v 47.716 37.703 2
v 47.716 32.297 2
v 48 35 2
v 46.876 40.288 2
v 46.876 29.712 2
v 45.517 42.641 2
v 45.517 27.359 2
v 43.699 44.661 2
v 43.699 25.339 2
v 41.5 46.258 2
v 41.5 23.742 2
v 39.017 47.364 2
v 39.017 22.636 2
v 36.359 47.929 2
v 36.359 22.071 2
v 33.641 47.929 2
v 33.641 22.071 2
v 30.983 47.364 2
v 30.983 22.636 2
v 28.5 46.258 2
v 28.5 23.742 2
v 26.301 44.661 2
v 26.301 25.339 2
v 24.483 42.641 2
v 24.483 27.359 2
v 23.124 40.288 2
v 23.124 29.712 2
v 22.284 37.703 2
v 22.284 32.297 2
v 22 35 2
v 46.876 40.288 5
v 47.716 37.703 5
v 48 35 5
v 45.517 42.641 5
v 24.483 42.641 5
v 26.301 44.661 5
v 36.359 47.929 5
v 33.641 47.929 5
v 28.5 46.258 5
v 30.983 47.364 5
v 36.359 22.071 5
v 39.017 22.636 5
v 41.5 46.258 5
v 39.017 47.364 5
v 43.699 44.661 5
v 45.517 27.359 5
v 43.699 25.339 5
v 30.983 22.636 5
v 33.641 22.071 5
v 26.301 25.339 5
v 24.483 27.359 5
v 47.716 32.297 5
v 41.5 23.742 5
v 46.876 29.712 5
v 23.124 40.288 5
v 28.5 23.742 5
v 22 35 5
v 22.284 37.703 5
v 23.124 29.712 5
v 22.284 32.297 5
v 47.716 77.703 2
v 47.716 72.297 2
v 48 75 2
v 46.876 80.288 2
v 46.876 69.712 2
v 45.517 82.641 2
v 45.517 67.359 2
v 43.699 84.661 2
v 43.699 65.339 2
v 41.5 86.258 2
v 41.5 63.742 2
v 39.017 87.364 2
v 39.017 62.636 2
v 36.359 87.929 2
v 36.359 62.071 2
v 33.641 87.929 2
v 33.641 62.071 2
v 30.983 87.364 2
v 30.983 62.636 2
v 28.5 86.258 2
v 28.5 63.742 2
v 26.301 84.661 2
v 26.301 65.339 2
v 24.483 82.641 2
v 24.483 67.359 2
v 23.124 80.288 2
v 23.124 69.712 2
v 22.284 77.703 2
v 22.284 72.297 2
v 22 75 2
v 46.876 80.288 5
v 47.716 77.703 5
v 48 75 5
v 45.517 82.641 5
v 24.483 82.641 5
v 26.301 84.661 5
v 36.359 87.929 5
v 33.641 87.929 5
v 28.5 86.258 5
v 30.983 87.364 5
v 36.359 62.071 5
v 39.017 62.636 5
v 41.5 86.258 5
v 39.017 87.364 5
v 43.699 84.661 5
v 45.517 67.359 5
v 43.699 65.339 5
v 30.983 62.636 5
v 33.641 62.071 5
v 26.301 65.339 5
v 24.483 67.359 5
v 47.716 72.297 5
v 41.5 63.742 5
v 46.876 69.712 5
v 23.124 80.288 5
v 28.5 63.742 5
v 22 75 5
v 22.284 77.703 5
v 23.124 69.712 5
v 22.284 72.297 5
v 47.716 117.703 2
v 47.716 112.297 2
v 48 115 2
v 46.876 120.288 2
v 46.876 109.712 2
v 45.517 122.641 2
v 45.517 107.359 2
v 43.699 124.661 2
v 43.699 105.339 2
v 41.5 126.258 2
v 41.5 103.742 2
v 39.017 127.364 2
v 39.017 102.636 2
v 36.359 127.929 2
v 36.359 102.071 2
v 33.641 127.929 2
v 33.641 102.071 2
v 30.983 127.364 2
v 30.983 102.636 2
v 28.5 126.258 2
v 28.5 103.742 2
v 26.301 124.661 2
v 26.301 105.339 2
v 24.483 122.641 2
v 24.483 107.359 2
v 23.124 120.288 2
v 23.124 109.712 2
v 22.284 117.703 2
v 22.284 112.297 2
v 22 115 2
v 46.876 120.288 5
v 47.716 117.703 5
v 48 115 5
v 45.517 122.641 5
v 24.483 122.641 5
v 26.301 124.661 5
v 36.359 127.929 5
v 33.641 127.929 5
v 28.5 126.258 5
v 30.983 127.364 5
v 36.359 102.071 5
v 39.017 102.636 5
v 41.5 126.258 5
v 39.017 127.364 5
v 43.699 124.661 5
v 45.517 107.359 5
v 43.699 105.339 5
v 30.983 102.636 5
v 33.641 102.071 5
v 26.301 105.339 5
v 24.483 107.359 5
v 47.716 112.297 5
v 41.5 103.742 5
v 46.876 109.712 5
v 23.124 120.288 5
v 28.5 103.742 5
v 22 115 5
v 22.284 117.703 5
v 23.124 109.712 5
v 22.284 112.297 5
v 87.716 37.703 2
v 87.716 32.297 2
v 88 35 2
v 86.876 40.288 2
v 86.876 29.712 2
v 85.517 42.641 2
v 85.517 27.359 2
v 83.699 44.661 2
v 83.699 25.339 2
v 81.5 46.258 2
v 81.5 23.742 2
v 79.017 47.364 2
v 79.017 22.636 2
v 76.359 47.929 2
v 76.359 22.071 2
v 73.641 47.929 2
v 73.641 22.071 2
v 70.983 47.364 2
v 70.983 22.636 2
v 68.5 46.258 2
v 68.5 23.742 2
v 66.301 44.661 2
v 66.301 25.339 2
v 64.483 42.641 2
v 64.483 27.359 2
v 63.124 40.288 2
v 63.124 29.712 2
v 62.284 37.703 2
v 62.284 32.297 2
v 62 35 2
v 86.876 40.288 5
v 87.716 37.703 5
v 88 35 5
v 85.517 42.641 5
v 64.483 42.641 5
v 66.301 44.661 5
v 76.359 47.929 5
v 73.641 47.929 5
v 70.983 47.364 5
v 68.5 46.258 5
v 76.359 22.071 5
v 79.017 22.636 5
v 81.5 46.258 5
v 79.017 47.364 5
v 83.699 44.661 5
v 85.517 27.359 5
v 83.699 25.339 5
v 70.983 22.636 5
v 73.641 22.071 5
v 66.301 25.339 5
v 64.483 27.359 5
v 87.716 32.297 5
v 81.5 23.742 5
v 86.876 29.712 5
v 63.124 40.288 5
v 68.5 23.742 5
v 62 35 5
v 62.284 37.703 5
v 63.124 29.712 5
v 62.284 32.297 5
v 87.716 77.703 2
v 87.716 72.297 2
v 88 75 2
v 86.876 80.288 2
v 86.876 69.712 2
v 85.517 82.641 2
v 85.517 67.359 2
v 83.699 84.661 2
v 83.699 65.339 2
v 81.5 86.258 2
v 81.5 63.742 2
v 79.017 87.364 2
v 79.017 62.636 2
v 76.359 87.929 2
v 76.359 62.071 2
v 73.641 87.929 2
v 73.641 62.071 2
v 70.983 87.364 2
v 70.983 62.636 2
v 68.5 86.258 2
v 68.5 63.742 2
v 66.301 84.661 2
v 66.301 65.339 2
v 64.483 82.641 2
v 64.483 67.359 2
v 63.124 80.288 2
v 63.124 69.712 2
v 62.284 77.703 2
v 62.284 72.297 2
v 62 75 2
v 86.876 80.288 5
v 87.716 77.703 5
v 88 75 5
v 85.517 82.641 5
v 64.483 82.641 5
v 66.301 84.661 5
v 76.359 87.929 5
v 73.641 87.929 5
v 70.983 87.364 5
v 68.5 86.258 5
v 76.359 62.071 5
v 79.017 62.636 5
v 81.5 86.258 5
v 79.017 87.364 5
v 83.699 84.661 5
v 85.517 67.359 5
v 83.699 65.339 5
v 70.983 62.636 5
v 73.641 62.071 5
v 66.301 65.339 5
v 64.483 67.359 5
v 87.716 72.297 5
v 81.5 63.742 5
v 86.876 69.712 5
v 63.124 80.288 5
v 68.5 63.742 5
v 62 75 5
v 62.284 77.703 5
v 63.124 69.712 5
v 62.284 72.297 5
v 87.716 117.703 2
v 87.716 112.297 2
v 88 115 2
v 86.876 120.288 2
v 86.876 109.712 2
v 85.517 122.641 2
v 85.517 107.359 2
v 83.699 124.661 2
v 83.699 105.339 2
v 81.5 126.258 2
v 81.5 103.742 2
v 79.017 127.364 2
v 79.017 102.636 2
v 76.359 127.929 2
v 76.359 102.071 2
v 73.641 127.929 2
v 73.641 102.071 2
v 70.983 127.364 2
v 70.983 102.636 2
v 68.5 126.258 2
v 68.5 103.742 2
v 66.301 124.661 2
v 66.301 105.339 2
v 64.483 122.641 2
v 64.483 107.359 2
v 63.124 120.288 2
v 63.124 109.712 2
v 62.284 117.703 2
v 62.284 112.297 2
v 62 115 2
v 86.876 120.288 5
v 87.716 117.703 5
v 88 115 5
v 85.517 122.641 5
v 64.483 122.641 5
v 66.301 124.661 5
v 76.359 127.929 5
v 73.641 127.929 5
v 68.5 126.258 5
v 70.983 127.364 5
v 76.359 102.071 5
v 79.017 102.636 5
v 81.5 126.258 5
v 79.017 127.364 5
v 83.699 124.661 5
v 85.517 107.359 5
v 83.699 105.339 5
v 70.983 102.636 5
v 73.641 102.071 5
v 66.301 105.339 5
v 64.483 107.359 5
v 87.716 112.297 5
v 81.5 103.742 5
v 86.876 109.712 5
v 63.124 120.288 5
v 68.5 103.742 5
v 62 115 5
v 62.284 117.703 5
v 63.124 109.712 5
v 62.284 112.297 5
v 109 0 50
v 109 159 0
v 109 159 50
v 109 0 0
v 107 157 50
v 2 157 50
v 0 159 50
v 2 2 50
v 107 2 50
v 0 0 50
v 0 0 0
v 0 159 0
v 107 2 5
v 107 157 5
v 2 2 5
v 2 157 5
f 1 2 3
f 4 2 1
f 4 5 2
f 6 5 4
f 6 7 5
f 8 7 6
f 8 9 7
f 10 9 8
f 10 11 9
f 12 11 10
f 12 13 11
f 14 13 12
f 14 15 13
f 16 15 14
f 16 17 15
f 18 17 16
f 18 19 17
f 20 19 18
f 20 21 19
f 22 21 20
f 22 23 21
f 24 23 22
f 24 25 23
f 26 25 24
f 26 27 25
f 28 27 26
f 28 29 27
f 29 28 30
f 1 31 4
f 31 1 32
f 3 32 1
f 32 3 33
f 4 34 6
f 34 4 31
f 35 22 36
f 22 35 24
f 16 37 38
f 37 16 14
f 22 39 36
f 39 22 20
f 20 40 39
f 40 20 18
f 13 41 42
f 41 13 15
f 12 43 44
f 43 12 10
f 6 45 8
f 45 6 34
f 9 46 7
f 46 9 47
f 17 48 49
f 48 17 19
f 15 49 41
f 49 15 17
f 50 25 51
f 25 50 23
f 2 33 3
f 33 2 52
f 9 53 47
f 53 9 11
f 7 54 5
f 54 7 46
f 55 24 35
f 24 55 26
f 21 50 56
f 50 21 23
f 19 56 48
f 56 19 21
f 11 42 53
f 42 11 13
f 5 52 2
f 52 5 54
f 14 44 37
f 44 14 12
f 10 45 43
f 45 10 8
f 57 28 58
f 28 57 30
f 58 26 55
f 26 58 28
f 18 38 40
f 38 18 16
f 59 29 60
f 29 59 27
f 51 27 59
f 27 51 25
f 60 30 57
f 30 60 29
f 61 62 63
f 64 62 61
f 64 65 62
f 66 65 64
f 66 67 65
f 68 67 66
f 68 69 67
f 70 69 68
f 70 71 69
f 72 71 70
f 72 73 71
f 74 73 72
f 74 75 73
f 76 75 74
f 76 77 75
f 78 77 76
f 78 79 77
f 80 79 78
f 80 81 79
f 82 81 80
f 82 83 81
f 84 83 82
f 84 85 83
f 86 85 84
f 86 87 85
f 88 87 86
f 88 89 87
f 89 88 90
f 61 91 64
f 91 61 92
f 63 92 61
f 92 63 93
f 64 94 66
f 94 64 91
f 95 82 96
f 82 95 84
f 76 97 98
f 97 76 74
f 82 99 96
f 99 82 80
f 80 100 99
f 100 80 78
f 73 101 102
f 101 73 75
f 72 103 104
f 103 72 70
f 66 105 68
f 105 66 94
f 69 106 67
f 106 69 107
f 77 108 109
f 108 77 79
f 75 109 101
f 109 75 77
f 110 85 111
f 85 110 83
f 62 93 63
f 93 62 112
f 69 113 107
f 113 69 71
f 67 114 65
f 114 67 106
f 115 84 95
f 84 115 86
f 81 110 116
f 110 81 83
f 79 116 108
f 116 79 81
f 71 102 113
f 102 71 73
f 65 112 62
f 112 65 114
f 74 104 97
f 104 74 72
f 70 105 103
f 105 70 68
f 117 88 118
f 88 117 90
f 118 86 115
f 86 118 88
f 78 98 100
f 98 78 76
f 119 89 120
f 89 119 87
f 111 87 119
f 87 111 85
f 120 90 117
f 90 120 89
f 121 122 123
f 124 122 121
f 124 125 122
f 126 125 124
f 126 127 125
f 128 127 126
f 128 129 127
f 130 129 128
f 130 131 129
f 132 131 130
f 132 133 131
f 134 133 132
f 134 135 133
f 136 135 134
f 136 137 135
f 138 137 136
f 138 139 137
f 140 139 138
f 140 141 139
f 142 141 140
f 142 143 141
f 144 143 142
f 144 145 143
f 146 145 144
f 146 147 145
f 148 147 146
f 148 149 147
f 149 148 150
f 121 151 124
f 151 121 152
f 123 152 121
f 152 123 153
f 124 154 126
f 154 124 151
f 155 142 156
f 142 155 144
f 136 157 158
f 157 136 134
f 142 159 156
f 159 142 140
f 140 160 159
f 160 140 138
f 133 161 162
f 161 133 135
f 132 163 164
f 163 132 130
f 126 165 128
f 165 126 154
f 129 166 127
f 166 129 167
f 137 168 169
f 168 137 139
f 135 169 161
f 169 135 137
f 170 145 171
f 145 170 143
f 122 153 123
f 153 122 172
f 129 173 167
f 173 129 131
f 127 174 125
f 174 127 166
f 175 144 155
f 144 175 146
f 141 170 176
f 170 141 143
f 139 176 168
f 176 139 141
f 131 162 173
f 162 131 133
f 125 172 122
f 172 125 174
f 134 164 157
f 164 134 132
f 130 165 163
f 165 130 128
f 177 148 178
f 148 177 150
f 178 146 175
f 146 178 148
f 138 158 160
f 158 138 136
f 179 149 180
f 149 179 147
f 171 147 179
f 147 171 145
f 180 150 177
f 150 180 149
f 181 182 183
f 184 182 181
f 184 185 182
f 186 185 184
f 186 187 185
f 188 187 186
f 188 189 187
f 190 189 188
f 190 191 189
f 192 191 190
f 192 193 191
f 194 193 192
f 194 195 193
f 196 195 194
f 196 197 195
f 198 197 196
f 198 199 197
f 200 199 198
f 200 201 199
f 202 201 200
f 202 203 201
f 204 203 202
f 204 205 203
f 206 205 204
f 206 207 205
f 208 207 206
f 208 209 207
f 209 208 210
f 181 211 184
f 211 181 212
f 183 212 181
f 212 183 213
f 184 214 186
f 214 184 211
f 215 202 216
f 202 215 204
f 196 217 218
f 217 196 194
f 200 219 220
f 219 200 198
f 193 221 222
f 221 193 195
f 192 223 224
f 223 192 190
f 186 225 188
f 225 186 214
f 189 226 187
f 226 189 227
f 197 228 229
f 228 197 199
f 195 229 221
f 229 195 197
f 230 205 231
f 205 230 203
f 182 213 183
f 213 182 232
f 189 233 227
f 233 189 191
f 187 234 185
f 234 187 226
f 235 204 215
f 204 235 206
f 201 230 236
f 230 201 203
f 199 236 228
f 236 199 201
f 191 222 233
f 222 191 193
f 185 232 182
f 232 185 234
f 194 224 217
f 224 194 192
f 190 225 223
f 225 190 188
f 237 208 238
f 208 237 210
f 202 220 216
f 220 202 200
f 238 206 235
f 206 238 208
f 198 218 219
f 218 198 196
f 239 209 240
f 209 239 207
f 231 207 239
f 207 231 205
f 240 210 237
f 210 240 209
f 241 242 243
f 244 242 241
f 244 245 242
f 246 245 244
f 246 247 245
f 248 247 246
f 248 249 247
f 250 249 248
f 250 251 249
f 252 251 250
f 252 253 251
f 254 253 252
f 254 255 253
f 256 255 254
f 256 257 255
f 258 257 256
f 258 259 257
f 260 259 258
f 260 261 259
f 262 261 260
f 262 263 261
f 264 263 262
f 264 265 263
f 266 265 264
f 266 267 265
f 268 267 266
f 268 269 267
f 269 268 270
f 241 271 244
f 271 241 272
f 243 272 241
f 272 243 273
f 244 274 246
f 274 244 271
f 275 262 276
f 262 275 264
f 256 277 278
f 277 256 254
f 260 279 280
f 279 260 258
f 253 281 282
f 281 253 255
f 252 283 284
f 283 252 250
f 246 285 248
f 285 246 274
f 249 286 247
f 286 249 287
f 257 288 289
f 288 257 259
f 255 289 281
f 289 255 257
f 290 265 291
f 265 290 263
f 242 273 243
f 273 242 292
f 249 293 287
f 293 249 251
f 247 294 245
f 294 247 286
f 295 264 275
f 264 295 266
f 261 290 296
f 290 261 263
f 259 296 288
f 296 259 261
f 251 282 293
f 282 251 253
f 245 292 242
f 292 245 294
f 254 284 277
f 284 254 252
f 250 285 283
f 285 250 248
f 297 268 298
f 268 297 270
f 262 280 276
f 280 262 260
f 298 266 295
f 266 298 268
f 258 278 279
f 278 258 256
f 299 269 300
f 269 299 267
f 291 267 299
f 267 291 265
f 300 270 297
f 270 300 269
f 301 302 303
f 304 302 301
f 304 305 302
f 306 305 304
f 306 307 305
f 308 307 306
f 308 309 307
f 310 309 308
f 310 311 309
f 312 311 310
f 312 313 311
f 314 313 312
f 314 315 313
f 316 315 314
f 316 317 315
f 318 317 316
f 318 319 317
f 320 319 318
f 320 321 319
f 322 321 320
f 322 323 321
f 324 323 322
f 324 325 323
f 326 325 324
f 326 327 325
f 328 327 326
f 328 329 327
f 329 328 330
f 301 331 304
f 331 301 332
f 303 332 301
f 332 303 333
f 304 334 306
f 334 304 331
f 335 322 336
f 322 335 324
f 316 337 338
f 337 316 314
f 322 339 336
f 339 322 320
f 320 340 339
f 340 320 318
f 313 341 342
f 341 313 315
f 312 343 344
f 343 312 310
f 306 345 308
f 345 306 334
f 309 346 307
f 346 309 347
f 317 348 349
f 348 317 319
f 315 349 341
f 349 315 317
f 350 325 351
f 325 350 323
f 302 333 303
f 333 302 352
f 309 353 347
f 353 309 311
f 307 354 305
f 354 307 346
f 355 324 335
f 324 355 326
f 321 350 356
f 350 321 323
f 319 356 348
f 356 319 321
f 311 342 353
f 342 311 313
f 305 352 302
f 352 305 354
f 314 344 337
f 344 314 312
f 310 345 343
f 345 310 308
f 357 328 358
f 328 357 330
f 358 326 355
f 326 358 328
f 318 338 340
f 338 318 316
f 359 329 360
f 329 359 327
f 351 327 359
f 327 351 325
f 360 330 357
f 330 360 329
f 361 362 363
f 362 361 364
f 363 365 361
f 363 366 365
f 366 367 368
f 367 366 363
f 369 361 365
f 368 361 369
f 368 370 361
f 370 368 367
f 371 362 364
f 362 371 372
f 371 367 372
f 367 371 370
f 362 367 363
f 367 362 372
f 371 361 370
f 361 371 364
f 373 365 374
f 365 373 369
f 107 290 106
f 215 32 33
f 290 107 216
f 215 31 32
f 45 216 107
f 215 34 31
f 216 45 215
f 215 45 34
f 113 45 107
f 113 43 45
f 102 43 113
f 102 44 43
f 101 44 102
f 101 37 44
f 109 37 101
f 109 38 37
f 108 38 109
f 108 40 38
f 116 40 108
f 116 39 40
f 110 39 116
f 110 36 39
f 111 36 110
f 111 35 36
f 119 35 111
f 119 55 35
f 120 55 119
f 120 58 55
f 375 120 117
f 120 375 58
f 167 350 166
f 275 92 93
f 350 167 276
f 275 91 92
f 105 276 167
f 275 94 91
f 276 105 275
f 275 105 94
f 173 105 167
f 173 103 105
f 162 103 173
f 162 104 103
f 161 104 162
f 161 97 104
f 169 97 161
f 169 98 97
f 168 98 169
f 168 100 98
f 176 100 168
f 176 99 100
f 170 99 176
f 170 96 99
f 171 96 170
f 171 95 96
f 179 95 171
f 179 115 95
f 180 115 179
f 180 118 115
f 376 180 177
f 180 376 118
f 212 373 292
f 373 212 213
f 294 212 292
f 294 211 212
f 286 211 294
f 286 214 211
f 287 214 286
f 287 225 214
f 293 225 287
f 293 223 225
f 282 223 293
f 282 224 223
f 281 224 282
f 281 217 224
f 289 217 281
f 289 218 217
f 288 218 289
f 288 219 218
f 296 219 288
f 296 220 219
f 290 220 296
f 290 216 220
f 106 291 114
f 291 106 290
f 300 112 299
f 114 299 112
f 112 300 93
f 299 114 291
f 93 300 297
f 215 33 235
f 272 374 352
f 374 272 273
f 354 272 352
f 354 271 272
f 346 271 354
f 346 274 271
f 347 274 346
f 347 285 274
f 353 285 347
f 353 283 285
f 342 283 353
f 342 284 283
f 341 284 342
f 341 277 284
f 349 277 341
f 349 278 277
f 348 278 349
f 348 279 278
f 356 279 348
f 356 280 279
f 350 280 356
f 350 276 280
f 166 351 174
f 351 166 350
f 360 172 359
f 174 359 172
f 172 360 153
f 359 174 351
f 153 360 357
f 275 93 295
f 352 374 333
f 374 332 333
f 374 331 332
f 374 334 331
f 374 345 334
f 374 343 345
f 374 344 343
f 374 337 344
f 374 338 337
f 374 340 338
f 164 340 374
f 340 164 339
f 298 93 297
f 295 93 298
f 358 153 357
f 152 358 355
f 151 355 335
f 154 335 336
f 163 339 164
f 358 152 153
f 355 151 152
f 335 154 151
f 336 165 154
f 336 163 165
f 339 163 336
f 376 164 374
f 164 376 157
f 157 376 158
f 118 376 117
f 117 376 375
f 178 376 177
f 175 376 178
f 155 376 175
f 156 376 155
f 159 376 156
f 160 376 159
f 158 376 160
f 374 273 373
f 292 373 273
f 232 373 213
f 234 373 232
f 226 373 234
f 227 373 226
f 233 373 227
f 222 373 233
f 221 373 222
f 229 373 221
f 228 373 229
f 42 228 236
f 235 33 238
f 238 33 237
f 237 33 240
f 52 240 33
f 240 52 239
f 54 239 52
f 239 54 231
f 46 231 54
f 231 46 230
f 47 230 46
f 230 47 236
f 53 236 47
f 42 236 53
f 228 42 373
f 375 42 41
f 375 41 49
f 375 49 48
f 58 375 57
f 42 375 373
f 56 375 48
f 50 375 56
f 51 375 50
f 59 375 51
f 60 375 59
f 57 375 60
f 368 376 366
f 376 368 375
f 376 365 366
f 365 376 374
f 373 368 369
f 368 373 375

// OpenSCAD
//$fn=360;
//67x93x22
x=109;
y=159;
z=50;
base=26;
//square([x+4,y+4]);
difference() {
    translate([0,0,0])
    cube([x,y,z]);
    translate([2,2,5])
    cube([x-4,y-4,z]);
    for ( x1= [35,75] ) {
      for ( y1= [35,75,115] ) {  
        translate([x1,y1,z-48])
        cylinder(h=5,d=base);
      }
  }
}
